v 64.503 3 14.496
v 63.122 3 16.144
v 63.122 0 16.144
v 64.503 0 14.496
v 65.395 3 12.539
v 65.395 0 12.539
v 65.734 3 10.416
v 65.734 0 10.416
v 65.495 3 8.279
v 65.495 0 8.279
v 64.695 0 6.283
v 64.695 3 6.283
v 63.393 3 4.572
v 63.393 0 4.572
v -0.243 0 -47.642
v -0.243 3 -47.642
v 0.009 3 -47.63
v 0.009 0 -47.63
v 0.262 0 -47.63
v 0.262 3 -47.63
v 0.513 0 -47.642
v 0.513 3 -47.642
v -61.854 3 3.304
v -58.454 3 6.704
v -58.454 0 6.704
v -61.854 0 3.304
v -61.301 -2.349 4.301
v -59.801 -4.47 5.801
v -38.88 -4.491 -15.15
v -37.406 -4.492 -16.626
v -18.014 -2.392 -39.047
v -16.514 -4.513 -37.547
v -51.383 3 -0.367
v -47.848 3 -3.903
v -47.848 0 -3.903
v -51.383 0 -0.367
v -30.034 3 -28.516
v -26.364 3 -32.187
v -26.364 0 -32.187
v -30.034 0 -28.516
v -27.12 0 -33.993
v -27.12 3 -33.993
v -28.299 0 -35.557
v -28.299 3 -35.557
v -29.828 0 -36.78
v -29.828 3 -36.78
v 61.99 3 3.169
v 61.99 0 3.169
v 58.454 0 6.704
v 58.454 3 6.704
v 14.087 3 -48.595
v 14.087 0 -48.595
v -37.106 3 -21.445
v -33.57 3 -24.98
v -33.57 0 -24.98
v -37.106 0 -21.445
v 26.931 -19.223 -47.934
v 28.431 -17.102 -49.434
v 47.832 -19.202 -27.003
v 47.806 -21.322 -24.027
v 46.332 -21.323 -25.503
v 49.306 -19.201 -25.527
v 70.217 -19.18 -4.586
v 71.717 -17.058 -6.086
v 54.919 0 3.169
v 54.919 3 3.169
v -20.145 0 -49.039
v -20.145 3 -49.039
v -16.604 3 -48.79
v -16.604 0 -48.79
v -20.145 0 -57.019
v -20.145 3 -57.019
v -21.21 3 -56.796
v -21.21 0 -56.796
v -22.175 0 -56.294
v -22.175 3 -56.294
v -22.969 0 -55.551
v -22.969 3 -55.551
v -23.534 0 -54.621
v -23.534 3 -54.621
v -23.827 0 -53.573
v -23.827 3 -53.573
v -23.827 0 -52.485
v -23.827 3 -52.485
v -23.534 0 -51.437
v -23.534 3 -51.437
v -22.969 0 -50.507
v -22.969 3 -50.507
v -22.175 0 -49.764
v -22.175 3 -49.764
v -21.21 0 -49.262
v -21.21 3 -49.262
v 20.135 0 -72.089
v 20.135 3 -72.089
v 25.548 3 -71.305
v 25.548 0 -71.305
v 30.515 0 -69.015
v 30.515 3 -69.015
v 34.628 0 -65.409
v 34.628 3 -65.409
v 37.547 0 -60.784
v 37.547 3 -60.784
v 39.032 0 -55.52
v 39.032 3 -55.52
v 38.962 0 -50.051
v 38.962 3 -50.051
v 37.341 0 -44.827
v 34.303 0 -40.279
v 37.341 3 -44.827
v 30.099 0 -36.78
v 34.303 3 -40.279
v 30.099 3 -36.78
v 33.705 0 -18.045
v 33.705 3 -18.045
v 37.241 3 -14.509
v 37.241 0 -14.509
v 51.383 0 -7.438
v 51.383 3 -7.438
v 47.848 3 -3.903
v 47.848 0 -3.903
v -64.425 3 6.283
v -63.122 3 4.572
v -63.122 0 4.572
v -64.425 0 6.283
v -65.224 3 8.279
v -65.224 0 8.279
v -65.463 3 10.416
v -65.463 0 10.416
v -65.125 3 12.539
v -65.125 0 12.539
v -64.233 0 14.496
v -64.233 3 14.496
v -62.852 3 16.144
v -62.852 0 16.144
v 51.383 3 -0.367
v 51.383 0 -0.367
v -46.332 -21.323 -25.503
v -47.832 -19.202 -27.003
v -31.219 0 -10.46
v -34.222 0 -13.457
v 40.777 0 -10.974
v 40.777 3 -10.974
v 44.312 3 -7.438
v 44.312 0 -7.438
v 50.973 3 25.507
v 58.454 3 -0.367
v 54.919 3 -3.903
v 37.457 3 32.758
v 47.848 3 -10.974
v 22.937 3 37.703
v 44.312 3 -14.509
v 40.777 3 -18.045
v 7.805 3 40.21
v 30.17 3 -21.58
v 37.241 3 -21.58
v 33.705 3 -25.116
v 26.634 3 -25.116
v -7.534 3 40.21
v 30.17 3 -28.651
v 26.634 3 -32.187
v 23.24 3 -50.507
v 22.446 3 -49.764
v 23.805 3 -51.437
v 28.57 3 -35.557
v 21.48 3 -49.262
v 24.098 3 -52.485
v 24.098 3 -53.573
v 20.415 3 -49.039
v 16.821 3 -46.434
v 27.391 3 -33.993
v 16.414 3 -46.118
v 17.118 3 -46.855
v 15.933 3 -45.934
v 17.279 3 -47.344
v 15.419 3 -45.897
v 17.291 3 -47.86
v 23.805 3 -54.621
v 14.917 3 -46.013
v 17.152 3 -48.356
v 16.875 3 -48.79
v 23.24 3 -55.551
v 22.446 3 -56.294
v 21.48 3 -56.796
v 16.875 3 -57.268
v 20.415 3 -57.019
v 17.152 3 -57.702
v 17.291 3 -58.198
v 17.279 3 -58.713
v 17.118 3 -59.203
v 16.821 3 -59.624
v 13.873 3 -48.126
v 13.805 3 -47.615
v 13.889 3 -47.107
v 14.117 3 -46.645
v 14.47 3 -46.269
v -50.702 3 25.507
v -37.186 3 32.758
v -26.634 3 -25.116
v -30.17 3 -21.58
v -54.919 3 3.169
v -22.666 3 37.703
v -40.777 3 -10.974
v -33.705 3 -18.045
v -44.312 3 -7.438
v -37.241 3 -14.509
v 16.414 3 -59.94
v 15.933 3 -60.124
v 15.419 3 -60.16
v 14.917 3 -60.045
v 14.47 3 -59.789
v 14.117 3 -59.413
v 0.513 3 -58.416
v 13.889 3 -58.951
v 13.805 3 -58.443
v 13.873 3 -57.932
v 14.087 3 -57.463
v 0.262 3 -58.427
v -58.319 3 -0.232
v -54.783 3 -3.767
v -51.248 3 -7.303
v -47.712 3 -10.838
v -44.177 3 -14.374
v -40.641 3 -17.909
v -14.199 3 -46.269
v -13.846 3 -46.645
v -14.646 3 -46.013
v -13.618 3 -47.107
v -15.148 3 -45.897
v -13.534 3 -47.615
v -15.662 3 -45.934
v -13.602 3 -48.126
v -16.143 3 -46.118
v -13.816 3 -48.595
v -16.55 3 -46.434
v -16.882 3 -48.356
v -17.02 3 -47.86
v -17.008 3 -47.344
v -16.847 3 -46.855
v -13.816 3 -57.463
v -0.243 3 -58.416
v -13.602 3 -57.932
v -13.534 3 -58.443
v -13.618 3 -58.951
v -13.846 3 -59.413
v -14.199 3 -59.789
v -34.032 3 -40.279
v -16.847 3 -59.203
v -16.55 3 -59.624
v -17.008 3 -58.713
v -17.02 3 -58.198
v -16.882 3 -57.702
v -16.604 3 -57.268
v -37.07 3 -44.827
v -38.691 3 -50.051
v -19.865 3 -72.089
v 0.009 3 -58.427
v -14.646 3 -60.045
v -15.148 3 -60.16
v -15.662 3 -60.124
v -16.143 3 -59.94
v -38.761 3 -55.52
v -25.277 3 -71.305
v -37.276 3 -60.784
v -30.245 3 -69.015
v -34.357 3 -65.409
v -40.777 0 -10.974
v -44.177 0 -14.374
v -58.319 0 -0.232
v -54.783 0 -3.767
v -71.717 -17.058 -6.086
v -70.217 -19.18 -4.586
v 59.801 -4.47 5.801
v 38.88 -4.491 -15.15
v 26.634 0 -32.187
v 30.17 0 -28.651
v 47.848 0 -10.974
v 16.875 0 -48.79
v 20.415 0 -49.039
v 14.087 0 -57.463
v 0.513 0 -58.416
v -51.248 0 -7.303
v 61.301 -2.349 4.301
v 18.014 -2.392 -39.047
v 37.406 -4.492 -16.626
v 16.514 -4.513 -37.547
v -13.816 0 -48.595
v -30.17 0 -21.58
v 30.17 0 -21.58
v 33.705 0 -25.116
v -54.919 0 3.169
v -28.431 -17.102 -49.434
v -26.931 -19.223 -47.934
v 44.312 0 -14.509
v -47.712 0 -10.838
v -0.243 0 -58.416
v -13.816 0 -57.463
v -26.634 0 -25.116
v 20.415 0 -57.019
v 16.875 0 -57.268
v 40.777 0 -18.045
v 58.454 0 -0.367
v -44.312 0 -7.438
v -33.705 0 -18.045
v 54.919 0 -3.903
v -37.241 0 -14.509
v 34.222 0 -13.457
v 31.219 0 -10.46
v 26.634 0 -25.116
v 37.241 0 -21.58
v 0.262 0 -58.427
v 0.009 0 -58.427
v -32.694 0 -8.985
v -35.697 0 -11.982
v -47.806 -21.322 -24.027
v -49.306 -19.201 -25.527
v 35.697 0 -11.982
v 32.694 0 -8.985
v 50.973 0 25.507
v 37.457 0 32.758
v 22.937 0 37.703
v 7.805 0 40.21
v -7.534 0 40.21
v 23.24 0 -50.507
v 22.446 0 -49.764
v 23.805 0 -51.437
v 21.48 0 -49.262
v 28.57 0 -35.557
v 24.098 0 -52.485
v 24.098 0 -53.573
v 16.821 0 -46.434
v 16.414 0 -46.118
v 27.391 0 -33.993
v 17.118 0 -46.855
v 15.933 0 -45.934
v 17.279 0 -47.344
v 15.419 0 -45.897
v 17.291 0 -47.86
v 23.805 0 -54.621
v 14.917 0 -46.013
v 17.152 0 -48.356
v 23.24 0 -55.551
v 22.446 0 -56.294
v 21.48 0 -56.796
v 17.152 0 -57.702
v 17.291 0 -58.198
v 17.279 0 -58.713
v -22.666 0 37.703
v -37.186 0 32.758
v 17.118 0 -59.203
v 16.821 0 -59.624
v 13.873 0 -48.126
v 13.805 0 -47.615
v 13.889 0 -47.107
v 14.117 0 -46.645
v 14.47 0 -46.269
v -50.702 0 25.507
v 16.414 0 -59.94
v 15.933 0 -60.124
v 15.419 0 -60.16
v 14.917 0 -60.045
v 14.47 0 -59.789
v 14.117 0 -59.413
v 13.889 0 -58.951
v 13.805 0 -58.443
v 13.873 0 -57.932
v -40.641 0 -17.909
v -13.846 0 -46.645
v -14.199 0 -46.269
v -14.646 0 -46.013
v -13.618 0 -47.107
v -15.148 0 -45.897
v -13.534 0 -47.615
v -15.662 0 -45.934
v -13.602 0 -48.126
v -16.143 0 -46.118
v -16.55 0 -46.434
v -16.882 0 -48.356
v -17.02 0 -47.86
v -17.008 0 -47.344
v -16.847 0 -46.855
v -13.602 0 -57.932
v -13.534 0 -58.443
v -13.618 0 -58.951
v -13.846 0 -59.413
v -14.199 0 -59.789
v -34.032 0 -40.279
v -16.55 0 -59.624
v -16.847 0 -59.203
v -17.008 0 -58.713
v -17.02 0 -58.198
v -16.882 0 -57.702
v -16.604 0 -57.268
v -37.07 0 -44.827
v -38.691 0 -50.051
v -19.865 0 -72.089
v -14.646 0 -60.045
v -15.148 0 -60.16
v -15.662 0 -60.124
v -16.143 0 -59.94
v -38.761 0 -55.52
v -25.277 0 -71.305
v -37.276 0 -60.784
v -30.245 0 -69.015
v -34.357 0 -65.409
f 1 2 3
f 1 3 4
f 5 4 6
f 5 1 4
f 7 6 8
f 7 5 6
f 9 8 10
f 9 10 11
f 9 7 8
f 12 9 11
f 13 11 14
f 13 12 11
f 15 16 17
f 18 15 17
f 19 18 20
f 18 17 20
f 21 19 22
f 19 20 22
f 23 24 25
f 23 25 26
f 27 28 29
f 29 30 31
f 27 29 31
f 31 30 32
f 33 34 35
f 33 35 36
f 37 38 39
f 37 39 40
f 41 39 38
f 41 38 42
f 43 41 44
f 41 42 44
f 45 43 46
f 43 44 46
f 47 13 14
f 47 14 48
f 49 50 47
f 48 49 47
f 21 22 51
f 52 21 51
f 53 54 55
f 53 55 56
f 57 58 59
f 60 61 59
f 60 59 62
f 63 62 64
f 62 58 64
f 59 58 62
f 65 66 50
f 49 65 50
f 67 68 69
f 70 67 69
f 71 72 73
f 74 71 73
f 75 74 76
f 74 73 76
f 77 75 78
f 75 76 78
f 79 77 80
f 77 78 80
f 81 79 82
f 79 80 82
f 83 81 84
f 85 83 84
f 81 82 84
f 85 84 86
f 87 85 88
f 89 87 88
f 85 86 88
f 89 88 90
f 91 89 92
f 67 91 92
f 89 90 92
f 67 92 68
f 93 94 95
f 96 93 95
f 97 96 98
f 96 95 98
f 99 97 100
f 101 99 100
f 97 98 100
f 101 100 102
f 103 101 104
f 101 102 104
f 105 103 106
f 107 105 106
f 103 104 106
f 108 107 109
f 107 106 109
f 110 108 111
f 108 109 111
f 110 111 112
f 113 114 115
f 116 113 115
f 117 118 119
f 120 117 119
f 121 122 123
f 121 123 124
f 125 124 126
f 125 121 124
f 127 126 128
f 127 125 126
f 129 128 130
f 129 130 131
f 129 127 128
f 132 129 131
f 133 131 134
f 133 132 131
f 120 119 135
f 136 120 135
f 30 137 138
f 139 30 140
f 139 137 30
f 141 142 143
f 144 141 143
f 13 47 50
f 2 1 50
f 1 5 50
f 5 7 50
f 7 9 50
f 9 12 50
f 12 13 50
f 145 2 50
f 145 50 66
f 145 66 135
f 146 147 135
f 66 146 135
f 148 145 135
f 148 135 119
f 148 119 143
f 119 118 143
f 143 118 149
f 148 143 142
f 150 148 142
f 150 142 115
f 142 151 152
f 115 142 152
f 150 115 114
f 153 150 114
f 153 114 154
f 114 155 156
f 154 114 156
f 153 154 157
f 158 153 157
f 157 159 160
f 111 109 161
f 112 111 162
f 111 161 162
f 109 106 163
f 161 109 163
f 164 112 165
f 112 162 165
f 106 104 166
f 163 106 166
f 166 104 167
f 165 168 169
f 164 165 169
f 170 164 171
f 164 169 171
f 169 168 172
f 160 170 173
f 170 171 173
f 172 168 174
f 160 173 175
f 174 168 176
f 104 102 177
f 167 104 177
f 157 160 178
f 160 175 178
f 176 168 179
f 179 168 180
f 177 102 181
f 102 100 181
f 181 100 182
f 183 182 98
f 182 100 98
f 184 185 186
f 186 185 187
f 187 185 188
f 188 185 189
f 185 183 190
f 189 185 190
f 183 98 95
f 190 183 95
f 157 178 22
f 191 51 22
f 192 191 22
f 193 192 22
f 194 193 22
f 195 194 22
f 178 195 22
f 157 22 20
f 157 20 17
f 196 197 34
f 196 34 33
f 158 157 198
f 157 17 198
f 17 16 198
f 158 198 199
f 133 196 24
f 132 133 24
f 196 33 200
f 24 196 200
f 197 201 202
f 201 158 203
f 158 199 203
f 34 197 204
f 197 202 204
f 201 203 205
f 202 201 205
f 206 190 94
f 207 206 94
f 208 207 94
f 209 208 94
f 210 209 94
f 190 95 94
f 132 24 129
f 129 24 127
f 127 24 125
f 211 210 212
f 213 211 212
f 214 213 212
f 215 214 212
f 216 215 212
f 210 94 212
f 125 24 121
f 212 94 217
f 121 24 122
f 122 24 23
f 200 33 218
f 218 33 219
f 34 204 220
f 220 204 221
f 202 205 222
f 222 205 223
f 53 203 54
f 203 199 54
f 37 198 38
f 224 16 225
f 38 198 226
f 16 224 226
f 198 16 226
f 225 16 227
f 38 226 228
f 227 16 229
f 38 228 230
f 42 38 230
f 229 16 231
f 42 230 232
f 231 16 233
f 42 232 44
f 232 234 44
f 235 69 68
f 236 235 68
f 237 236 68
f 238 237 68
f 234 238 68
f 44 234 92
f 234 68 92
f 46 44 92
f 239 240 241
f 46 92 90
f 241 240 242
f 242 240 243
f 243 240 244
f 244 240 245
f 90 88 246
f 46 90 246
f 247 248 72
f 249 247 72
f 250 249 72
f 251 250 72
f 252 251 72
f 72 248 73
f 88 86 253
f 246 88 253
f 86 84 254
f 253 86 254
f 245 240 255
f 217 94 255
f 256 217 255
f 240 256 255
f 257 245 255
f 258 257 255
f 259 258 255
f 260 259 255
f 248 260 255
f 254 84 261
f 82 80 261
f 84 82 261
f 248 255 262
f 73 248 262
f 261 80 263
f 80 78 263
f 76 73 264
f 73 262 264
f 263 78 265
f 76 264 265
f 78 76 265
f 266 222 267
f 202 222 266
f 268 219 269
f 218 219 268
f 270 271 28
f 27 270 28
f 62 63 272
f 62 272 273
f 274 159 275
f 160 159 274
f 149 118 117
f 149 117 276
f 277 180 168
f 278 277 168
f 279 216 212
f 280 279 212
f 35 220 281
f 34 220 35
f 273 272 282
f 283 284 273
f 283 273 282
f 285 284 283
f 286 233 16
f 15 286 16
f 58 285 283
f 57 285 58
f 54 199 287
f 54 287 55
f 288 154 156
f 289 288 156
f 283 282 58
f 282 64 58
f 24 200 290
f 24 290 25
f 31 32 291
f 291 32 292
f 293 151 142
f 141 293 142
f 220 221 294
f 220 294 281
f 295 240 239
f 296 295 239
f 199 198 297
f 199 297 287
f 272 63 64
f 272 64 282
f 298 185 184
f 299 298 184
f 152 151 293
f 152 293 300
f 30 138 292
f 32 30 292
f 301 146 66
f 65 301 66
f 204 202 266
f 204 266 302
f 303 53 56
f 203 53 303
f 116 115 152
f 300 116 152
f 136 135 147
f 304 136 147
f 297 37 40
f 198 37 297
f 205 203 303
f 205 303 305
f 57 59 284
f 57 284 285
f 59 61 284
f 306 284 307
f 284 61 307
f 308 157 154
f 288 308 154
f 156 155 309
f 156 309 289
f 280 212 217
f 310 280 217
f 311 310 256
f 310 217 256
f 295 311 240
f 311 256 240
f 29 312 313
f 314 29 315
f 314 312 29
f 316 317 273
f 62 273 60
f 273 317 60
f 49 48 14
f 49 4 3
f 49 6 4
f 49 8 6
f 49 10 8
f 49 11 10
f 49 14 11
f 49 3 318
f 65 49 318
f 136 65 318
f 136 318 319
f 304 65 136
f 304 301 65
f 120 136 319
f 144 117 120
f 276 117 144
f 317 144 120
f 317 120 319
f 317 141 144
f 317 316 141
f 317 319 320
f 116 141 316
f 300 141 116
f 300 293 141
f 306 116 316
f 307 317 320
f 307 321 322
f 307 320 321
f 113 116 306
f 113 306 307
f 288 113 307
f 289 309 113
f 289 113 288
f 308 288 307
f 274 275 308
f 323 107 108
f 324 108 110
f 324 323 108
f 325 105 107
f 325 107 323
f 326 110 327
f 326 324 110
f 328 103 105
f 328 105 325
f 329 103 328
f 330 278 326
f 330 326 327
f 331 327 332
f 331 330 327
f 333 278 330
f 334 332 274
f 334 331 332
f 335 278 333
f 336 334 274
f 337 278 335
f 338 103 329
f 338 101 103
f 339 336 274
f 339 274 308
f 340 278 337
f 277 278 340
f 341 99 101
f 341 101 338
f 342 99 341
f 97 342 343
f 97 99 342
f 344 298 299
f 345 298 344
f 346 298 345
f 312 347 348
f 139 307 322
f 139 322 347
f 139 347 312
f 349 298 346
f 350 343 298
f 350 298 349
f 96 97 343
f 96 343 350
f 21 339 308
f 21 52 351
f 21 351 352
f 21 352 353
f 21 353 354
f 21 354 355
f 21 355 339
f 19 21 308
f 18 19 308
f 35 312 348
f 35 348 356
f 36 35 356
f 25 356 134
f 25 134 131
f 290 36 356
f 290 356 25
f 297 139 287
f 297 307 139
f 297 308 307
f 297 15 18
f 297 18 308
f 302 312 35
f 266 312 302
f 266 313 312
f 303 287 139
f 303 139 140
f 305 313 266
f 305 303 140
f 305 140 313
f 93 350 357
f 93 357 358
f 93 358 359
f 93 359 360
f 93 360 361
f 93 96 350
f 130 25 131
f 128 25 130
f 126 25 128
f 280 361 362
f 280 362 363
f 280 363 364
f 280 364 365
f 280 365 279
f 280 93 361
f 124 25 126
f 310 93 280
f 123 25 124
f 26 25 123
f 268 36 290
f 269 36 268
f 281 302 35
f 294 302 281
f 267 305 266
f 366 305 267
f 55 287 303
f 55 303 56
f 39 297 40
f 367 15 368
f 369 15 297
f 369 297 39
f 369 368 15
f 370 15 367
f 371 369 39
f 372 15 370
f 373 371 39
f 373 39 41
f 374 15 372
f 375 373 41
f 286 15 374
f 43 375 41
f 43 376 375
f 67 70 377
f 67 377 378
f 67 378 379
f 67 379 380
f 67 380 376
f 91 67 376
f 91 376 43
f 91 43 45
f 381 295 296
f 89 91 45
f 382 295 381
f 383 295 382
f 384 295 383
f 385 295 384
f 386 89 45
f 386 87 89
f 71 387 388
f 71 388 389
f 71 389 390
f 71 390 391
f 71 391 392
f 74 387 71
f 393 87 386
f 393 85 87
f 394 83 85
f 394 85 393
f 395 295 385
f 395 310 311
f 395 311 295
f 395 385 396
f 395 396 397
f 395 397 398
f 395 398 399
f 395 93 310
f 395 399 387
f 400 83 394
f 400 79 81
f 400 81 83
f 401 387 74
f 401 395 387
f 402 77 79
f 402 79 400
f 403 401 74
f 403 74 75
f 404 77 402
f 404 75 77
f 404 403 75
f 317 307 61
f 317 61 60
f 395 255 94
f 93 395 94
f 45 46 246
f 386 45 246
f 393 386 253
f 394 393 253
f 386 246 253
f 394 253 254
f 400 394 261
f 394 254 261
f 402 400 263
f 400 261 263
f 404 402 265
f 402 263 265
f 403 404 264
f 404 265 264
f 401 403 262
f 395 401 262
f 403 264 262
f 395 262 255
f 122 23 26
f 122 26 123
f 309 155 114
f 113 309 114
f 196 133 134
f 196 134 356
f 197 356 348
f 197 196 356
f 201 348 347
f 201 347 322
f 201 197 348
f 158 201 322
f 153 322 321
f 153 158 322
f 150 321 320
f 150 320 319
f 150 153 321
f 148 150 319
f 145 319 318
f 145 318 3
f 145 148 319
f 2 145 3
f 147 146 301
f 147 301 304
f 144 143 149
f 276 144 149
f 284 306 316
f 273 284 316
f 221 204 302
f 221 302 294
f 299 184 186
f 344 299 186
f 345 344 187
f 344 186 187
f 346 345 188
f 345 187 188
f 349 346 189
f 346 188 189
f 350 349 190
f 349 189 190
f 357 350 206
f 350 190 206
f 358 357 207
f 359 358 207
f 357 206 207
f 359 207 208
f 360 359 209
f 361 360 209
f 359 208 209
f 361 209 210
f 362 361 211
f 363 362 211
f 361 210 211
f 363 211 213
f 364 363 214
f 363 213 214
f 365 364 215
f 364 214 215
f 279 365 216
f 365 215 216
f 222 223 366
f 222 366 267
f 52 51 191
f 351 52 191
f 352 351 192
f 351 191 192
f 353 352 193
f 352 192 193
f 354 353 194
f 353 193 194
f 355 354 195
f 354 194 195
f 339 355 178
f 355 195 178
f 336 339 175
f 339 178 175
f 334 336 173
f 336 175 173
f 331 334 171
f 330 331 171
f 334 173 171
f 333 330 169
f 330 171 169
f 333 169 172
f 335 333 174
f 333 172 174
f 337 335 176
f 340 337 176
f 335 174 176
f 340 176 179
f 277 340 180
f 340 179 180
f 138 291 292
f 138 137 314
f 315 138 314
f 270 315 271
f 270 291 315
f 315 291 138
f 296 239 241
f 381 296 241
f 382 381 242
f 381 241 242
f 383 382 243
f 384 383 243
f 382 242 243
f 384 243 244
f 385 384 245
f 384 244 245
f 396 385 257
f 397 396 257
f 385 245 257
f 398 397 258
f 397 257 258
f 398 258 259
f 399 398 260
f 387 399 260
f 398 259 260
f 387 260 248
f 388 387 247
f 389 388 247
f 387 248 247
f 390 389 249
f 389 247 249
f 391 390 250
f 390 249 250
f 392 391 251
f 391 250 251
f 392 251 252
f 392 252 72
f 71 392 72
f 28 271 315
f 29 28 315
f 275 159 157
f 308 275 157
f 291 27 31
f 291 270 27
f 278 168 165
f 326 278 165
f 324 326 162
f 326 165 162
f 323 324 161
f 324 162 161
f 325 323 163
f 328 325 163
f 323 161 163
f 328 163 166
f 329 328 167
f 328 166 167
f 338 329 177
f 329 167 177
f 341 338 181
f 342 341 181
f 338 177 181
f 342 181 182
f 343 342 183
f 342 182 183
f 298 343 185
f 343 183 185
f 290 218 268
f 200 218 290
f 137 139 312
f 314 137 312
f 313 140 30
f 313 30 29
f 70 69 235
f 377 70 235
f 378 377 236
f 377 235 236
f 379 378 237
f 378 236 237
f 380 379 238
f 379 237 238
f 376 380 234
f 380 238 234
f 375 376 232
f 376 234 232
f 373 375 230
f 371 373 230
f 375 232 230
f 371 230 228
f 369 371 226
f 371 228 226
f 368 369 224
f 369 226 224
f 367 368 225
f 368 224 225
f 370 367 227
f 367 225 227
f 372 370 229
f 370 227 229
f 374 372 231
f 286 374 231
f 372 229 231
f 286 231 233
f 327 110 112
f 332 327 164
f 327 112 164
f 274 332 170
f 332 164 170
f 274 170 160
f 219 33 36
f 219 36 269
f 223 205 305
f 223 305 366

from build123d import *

# Parameters (mm, degrees)
SKETCH_1_W          = 180
SKETCH_1_H          = 123.475609756
EXTRUDE_1_DEPTH     = 3
SKETCH_2_OUTSIDE_W  = 225.66
SKETCH_2_OUTSIDE_H  = 169.136
CUT_EXTRUDE_1_DEPTH = 10
EXTRUDE_3_DEPTH     = 1.5
EXTRUDE_4_DEPTH     = 3
CUT_EXTRUDE_2_DEPTH = 13
EXTRUDE_5_DEPTH     = 3
CUT_EXTRUDE_4_DEPTH = 5


with BuildPart() as part:
    # 草图1 → 凸台-拉伸1 (new body)
    with BuildSketch(Plane(origin=(0, 0, 0), x_dir=(1, 0, 0), z_dir=(0, 1, 0))):
        Rectangle(SKETCH_1_W, SKETCH_1_H)
    extrude(amount=EXTRUDE_1_DEPTH)

    # 草图2 outside → 切除-拉伸1 (cut)
    with BuildSketch(Plane(origin=(0, 3, 0), x_dir=(1, 0, 0), z_dir=(0, 1, 0))):
        Rectangle(SKETCH_2_OUTSIDE_W, SKETCH_2_OUTSIDE_H)
        with BuildLine():
            Line((63.393156076, -4.57196386), (17.660793085, 41.160399131))
            ThreePointArc((17.660793085, 41.160399131), (13.212332654, 43.192679399), (8.519172912, 41.81673793))
            ThreePointArc((8.519172912, 41.81673793), (0.135427504, 39.028910463), (-8.248317905, 41.81673793))
            ThreePointArc((-8.248317905, 41.81673793), (-12.941477647, 43.192679399), (-17.389938078, 41.160399131))
            Line((-17.389938078, 41.160399131), (-63.122301068, -4.57196386))
            ThreePointArc((-63.122301068, -4.57196386), (-65.463259353, -10.415886745), (-62.851632161, -16.14396878))
            ThreePointArc((-62.851632161, -16.14396878), (0.135427504, -40.524587109), (63.122487168, -16.14396878))
            ThreePointArc((63.122487168, -16.14396878), (65.73411436, -10.415886745), (63.393156076, -4.57196386))
        make_face(mode=Mode.SUBTRACT)
    extrude(amount=-CUT_EXTRUDE_1_DEPTH, mode=Mode.SUBTRACT)

    # 草图4 → 凸台-拉伸3 (add, symmetric)
    with BuildSketch(Plane(origin=(11.169764148, 15.796431947, -11.169764148), x_dir=(-0.8660254037844386, 0.40824829046386313, -0.288675134594813), z_dir=(-0.5000000000000001, -0.7071067811865476, 0.49999999999999983))):
        Polygon((-42.887555568, 35.134950382), (-23.8863598, 8.357630936), (-25.587706579, 7.150354633), (-44.588902348, 33.927674079), align=None)
    extrude_3 = extrude(amount=EXTRUDE_3_DEPTH, both=True)

    # 草图5 → 凸台-拉伸4 (add)
    with BuildSketch(Plane(origin=(11.919764148, 16.857092119, -11.919764148), x_dir=(0.8660254037844387, -0.408248290463863, 0.2886751345948128), z_dir=(0.49999999999999994, 0.7071067811865477, -0.4999999999999999))):
        Polygon((5.305528324, 33.262652537), (23.440849678, 58.85571886), (73.424034658, 23.437488372), (55.288713303, -2.155577951), align=None)
    extrude_4 = extrude(amount=EXTRUDE_4_DEPTH)

    # 草图6 → 切除-拉伸2 (cut)
    with BuildSketch(Plane(origin=(13.419764148, 18.978412462, -13.419764148), x_dir=(0.8660254037844387, -0.40824829046386313, 0.2886751345948128), z_dir=(0.5, 0.7071067811865477, -0.49999999999999983))):
        Polygon((17.332913893, 50.236031202), (67.316098873, 14.817800715), (73.424034658, 23.437488372), (23.440849678, 58.85571886), align=None)
    cut_extrude_2 = extrude(amount=-CUT_EXTRUDE_2_DEPTH, mode=Mode.SUBTRACT)

    # 镜向2: 凸台-拉伸3, 凸台-拉伸4, 切除-拉伸2 across plane
    add(extrude_3.mirror(Plane(origin=(0, 0, 0), x_dir=(0, 0, 1), z_dir=(1, 0, 0))))
    add(extrude_4.mirror(Plane(origin=(0, 0, 0), x_dir=(0, 0, 1), z_dir=(1, 0, 0))))
    add(cut_extrude_2.mirror(Plane(origin=(0, 0, 0), x_dir=(0, 0, 1), z_dir=(1, 0, 0))), mode=Mode.SUBTRACT)

    # 草图7 → 凸台-拉伸5 (add)
    with BuildSketch(Plane(origin=(0, 3, 0), x_dir=(1, 0, 0), z_dir=(0, 1, 0))):
        with BuildLine():
            Line((-19.864572496, 72.089252639), (20.135427504, 72.089252639))
            ThreePointArc((20.135427504, 72.089252639), (38.479418015, 58.205265935), (30.099048805, 36.780129142))
            ThreePointArc((30.099048805, 36.780129142), (26.400179556, 30.999210524), (28.649163581, 24.515174385))
            Line((28.649163581, 24.515174385), (-28.378308574, 24.515174385))
            ThreePointArc((-28.378308574, 24.515174385), (-26.129324549, 30.999210524), (-29.828193798, 36.780129142))
            ThreePointArc((-29.828193798, 36.780129142), (-38.208563008, 58.205265935), (-19.864572496, 72.089252639))
        make_face()
        with BuildLine():
            Line((20.415427504, 57.019098429), (16.875331791, 57.267514495))
            ThreePointArc((16.875331791, 57.267514495), (15.677130379, 60.161371451), (14.08652518, 57.463211003))
            Line((14.08652518, 57.463211003), (0.513427504, 58.415664216))
            ThreePointArc((0.513427504, 58.415664216), (0.135427504, 58.428910463), (-0.242572496, 58.415664216))
            Line((-0.242572496, 58.415664216), (-13.815670173, 57.463211003))
            ThreePointArc((-13.815670173, 57.463211003), (-15.406275372, 60.161371451), (-16.604476783, 57.267514495))
            Line((-16.604476783, 57.267514495), (-20.144572496, 57.019098429))
            ThreePointArc((-20.144572496, 57.019098429), (-23.864572496, 53.028910463), (-20.144572496, 49.038722498))
            Line((-20.144572496, 49.038722498), (-16.604476783, 48.790306431))
            ThreePointArc((-16.604476783, 48.790306431), (-15.406275372, 45.896449475), (-13.815670173, 48.594609923))
            Line((-13.815670173, 48.594609923), (-0.242572496, 47.64215671))
            ThreePointArc((-0.242572496, 47.64215671), (0.135427504, 47.628910463), (0.513427504, 47.64215671))
            Line((0.513427504, 47.64215671), (14.08652518, 48.594609923))
            ThreePointArc((14.08652518, 48.594609923), (15.677130379, 45.896449475), (16.875331791, 48.790306431))
            Line((16.875331791, 48.790306431), (20.415427504, 49.038722498))
            ThreePointArc((20.415427504, 49.038722498), (24.135427504, 53.028910463), (20.415427504, 57.019098429))
        make_face(mode=Mode.SUBTRACT)
    extrude(amount=-EXTRUDE_5_DEPTH)

    # 草图8 → 切除-拉伸4 (cut)
    with BuildSketch(Plane(origin=(0, 3, 0), x_dir=(1, 0, 0), z_dir=(0, 1, 0))):
        Polygon((54.918650137, -3.168525733), (58.454184043, -6.704059639), (61.989717949, -3.168525733), (58.454184043, 0.367008173), align=None)
        Polygon((51.383116231, 7.438075985), (47.847582325, 3.902542079), (51.383116231, 0.367008173), (54.918650137, 3.902542079), align=None)
        Polygon((44.31204842, 14.509143797), (40.776514514, 10.973609891), (44.31204842, 7.438075985), (47.847582325, 10.973609891), align=None)
        Polygon((37.240980608, 21.580211608), (33.705446702, 18.044677703), (37.240980608, 14.509143797), (40.776514514, 18.044677703), align=None)
        Polygon((30.169912796, 28.65127942), (26.63437889, 25.115745514), (30.169912796, 21.580211608), (33.705446702, 25.115745514), align=None)
        Polygon((-33.705446702, 25.115745514), (-30.169912796, 28.65127942), (-26.63437889, 25.115745514), (-30.169912796, 21.580211608), align=None)
        Polygon((-40.776514514, 18.044677703), (-37.240980608, 21.580211608), (-33.705446702, 18.044677703), (-37.240980608, 14.509143797), align=None)
        Polygon((-47.847582325, 10.973609891), (-44.31204842, 14.509143797), (-40.776514514, 10.973609891), (-44.31204842, 7.438075985), align=None)
        Polygon((-54.918650137, 3.902542079), (-51.383116231, 7.438075985), (-47.847582325, 3.902542079), (-51.383116231, 0.367008173), align=None)
        Polygon((-58.454184043, 0.367008173), (-54.918650137, -3.168525733), (-58.454184043, -6.704059639), (-61.989717949, -3.168525733), align=None)
    extrude(amount=-CUT_EXTRUDE_4_DEPTH, mode=Mode.SUBTRACT)


solid = part.part
